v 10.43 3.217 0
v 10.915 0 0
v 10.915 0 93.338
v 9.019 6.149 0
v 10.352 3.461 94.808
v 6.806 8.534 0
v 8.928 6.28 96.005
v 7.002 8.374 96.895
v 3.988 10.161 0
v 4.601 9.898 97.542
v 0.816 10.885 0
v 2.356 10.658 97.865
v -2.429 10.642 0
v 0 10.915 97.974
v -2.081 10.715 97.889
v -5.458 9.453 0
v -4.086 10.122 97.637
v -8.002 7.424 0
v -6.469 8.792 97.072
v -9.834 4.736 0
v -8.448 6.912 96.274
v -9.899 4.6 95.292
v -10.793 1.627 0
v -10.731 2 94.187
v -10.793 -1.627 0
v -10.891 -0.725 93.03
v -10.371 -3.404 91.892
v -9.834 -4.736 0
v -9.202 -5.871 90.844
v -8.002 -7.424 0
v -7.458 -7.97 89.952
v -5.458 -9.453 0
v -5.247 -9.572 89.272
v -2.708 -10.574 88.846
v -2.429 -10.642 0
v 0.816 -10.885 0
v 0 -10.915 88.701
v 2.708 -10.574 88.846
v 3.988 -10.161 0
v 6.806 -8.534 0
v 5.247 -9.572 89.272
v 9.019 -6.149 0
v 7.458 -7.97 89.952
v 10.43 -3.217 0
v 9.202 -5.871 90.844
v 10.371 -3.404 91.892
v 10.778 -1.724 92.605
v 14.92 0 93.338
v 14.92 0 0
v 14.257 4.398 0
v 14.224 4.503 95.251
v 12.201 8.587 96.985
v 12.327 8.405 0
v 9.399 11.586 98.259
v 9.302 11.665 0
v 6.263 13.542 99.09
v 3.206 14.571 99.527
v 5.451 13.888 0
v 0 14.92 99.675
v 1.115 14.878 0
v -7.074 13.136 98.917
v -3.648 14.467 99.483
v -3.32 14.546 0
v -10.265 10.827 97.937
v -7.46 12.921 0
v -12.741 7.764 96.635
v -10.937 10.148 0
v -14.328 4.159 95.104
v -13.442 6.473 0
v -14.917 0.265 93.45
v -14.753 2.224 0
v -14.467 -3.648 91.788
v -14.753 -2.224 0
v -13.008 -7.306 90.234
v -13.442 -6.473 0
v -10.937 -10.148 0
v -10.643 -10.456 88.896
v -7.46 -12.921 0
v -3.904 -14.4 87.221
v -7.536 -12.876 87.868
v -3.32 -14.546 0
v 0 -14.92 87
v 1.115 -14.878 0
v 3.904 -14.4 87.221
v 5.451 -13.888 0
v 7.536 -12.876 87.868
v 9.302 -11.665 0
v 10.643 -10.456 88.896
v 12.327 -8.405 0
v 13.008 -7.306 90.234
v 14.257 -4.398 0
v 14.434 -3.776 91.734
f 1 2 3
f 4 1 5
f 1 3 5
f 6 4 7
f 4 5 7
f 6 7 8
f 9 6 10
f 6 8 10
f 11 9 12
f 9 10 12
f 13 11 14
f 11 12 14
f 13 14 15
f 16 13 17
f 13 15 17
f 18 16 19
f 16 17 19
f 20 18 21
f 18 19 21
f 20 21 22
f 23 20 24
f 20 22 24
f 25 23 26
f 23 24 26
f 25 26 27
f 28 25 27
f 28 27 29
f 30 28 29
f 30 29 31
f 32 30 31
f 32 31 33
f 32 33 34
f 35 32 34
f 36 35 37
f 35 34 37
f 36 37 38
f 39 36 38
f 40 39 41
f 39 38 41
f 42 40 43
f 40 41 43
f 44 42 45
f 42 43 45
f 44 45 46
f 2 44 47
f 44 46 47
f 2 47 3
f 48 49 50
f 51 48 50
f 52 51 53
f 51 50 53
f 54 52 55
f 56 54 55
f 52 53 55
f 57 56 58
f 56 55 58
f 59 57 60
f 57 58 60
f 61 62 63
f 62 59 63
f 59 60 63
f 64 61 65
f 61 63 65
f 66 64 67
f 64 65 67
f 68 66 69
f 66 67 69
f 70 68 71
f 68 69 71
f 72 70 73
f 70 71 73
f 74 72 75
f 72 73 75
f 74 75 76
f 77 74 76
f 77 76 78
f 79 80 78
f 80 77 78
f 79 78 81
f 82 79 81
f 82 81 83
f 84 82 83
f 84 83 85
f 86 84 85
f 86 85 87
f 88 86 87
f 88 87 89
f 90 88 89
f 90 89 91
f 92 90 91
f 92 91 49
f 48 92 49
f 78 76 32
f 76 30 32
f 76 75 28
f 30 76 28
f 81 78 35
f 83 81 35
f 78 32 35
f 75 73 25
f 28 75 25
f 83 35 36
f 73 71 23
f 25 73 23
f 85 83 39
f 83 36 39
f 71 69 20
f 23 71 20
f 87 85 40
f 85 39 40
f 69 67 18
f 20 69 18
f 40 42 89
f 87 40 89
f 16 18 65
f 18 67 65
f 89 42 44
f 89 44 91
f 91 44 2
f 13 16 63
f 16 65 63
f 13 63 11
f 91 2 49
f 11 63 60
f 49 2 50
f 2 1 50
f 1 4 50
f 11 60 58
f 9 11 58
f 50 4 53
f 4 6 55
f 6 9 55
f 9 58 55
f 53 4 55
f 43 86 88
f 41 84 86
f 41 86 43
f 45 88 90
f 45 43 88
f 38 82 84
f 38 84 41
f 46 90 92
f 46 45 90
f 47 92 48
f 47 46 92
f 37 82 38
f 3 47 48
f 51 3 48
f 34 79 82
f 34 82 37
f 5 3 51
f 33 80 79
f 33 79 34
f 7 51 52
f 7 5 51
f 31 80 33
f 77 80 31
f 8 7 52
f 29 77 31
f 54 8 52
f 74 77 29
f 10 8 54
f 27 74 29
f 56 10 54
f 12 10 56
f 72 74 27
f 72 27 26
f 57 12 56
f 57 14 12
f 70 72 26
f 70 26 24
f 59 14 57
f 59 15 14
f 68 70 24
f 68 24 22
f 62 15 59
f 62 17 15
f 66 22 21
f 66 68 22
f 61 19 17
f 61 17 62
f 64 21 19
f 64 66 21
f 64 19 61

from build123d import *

# Parameters (mm, degrees)
F0_R     = 14.919644
F1_DEPTH = 101.6
F2_R     = 10.915326
F3_DEPTH = 127
F5_DEPTH = 152.4
F6_DEPTH = 152.4
F7_DEPTH = 81.026


with BuildPart() as f1:
    # F0 (on Top) → F1 (new body)
    with BuildSketch(Plane.XY):
        Circle(F0_R)
    extrude(amount=F1_DEPTH)

    # F2 (on face) → F3 (cut)
    with BuildSketch(Plane.XY.offset(101.6)):
        Circle(F2_R)
    extrude(amount=-F3_DEPTH, mode=Mode.SUBTRACT)

    # F4 (on Right) → F5 (cut)
    with BuildSketch(Plane.YZ):
        Polygon((-28.046316, 81.424184), (20.338934, 101.977214), (-28.046316, 101.977214), align=None)
    extrude(amount=-F5_DEPTH, mode=Mode.SUBTRACT)

    # F4 (on Right) → F6 (cut)
    with BuildSketch(Plane.YZ):
        Polygon((-28.046316, 81.424184), (20.338934, 101.977214), (-28.046316, 101.977214), align=None)
    extrude(amount=-F6_DEPTH, mode=Mode.SUBTRACT)

    # F4 (on Right) → F7 (cut)
    with BuildSketch(Plane.YZ):
        Polygon((-28.046316, 81.424184), (20.338934, 101.977214), (-28.046316, 101.977214), align=None)
    extrude(amount=F7_DEPTH, mode=Mode.SUBTRACT)


solid = f1.part
